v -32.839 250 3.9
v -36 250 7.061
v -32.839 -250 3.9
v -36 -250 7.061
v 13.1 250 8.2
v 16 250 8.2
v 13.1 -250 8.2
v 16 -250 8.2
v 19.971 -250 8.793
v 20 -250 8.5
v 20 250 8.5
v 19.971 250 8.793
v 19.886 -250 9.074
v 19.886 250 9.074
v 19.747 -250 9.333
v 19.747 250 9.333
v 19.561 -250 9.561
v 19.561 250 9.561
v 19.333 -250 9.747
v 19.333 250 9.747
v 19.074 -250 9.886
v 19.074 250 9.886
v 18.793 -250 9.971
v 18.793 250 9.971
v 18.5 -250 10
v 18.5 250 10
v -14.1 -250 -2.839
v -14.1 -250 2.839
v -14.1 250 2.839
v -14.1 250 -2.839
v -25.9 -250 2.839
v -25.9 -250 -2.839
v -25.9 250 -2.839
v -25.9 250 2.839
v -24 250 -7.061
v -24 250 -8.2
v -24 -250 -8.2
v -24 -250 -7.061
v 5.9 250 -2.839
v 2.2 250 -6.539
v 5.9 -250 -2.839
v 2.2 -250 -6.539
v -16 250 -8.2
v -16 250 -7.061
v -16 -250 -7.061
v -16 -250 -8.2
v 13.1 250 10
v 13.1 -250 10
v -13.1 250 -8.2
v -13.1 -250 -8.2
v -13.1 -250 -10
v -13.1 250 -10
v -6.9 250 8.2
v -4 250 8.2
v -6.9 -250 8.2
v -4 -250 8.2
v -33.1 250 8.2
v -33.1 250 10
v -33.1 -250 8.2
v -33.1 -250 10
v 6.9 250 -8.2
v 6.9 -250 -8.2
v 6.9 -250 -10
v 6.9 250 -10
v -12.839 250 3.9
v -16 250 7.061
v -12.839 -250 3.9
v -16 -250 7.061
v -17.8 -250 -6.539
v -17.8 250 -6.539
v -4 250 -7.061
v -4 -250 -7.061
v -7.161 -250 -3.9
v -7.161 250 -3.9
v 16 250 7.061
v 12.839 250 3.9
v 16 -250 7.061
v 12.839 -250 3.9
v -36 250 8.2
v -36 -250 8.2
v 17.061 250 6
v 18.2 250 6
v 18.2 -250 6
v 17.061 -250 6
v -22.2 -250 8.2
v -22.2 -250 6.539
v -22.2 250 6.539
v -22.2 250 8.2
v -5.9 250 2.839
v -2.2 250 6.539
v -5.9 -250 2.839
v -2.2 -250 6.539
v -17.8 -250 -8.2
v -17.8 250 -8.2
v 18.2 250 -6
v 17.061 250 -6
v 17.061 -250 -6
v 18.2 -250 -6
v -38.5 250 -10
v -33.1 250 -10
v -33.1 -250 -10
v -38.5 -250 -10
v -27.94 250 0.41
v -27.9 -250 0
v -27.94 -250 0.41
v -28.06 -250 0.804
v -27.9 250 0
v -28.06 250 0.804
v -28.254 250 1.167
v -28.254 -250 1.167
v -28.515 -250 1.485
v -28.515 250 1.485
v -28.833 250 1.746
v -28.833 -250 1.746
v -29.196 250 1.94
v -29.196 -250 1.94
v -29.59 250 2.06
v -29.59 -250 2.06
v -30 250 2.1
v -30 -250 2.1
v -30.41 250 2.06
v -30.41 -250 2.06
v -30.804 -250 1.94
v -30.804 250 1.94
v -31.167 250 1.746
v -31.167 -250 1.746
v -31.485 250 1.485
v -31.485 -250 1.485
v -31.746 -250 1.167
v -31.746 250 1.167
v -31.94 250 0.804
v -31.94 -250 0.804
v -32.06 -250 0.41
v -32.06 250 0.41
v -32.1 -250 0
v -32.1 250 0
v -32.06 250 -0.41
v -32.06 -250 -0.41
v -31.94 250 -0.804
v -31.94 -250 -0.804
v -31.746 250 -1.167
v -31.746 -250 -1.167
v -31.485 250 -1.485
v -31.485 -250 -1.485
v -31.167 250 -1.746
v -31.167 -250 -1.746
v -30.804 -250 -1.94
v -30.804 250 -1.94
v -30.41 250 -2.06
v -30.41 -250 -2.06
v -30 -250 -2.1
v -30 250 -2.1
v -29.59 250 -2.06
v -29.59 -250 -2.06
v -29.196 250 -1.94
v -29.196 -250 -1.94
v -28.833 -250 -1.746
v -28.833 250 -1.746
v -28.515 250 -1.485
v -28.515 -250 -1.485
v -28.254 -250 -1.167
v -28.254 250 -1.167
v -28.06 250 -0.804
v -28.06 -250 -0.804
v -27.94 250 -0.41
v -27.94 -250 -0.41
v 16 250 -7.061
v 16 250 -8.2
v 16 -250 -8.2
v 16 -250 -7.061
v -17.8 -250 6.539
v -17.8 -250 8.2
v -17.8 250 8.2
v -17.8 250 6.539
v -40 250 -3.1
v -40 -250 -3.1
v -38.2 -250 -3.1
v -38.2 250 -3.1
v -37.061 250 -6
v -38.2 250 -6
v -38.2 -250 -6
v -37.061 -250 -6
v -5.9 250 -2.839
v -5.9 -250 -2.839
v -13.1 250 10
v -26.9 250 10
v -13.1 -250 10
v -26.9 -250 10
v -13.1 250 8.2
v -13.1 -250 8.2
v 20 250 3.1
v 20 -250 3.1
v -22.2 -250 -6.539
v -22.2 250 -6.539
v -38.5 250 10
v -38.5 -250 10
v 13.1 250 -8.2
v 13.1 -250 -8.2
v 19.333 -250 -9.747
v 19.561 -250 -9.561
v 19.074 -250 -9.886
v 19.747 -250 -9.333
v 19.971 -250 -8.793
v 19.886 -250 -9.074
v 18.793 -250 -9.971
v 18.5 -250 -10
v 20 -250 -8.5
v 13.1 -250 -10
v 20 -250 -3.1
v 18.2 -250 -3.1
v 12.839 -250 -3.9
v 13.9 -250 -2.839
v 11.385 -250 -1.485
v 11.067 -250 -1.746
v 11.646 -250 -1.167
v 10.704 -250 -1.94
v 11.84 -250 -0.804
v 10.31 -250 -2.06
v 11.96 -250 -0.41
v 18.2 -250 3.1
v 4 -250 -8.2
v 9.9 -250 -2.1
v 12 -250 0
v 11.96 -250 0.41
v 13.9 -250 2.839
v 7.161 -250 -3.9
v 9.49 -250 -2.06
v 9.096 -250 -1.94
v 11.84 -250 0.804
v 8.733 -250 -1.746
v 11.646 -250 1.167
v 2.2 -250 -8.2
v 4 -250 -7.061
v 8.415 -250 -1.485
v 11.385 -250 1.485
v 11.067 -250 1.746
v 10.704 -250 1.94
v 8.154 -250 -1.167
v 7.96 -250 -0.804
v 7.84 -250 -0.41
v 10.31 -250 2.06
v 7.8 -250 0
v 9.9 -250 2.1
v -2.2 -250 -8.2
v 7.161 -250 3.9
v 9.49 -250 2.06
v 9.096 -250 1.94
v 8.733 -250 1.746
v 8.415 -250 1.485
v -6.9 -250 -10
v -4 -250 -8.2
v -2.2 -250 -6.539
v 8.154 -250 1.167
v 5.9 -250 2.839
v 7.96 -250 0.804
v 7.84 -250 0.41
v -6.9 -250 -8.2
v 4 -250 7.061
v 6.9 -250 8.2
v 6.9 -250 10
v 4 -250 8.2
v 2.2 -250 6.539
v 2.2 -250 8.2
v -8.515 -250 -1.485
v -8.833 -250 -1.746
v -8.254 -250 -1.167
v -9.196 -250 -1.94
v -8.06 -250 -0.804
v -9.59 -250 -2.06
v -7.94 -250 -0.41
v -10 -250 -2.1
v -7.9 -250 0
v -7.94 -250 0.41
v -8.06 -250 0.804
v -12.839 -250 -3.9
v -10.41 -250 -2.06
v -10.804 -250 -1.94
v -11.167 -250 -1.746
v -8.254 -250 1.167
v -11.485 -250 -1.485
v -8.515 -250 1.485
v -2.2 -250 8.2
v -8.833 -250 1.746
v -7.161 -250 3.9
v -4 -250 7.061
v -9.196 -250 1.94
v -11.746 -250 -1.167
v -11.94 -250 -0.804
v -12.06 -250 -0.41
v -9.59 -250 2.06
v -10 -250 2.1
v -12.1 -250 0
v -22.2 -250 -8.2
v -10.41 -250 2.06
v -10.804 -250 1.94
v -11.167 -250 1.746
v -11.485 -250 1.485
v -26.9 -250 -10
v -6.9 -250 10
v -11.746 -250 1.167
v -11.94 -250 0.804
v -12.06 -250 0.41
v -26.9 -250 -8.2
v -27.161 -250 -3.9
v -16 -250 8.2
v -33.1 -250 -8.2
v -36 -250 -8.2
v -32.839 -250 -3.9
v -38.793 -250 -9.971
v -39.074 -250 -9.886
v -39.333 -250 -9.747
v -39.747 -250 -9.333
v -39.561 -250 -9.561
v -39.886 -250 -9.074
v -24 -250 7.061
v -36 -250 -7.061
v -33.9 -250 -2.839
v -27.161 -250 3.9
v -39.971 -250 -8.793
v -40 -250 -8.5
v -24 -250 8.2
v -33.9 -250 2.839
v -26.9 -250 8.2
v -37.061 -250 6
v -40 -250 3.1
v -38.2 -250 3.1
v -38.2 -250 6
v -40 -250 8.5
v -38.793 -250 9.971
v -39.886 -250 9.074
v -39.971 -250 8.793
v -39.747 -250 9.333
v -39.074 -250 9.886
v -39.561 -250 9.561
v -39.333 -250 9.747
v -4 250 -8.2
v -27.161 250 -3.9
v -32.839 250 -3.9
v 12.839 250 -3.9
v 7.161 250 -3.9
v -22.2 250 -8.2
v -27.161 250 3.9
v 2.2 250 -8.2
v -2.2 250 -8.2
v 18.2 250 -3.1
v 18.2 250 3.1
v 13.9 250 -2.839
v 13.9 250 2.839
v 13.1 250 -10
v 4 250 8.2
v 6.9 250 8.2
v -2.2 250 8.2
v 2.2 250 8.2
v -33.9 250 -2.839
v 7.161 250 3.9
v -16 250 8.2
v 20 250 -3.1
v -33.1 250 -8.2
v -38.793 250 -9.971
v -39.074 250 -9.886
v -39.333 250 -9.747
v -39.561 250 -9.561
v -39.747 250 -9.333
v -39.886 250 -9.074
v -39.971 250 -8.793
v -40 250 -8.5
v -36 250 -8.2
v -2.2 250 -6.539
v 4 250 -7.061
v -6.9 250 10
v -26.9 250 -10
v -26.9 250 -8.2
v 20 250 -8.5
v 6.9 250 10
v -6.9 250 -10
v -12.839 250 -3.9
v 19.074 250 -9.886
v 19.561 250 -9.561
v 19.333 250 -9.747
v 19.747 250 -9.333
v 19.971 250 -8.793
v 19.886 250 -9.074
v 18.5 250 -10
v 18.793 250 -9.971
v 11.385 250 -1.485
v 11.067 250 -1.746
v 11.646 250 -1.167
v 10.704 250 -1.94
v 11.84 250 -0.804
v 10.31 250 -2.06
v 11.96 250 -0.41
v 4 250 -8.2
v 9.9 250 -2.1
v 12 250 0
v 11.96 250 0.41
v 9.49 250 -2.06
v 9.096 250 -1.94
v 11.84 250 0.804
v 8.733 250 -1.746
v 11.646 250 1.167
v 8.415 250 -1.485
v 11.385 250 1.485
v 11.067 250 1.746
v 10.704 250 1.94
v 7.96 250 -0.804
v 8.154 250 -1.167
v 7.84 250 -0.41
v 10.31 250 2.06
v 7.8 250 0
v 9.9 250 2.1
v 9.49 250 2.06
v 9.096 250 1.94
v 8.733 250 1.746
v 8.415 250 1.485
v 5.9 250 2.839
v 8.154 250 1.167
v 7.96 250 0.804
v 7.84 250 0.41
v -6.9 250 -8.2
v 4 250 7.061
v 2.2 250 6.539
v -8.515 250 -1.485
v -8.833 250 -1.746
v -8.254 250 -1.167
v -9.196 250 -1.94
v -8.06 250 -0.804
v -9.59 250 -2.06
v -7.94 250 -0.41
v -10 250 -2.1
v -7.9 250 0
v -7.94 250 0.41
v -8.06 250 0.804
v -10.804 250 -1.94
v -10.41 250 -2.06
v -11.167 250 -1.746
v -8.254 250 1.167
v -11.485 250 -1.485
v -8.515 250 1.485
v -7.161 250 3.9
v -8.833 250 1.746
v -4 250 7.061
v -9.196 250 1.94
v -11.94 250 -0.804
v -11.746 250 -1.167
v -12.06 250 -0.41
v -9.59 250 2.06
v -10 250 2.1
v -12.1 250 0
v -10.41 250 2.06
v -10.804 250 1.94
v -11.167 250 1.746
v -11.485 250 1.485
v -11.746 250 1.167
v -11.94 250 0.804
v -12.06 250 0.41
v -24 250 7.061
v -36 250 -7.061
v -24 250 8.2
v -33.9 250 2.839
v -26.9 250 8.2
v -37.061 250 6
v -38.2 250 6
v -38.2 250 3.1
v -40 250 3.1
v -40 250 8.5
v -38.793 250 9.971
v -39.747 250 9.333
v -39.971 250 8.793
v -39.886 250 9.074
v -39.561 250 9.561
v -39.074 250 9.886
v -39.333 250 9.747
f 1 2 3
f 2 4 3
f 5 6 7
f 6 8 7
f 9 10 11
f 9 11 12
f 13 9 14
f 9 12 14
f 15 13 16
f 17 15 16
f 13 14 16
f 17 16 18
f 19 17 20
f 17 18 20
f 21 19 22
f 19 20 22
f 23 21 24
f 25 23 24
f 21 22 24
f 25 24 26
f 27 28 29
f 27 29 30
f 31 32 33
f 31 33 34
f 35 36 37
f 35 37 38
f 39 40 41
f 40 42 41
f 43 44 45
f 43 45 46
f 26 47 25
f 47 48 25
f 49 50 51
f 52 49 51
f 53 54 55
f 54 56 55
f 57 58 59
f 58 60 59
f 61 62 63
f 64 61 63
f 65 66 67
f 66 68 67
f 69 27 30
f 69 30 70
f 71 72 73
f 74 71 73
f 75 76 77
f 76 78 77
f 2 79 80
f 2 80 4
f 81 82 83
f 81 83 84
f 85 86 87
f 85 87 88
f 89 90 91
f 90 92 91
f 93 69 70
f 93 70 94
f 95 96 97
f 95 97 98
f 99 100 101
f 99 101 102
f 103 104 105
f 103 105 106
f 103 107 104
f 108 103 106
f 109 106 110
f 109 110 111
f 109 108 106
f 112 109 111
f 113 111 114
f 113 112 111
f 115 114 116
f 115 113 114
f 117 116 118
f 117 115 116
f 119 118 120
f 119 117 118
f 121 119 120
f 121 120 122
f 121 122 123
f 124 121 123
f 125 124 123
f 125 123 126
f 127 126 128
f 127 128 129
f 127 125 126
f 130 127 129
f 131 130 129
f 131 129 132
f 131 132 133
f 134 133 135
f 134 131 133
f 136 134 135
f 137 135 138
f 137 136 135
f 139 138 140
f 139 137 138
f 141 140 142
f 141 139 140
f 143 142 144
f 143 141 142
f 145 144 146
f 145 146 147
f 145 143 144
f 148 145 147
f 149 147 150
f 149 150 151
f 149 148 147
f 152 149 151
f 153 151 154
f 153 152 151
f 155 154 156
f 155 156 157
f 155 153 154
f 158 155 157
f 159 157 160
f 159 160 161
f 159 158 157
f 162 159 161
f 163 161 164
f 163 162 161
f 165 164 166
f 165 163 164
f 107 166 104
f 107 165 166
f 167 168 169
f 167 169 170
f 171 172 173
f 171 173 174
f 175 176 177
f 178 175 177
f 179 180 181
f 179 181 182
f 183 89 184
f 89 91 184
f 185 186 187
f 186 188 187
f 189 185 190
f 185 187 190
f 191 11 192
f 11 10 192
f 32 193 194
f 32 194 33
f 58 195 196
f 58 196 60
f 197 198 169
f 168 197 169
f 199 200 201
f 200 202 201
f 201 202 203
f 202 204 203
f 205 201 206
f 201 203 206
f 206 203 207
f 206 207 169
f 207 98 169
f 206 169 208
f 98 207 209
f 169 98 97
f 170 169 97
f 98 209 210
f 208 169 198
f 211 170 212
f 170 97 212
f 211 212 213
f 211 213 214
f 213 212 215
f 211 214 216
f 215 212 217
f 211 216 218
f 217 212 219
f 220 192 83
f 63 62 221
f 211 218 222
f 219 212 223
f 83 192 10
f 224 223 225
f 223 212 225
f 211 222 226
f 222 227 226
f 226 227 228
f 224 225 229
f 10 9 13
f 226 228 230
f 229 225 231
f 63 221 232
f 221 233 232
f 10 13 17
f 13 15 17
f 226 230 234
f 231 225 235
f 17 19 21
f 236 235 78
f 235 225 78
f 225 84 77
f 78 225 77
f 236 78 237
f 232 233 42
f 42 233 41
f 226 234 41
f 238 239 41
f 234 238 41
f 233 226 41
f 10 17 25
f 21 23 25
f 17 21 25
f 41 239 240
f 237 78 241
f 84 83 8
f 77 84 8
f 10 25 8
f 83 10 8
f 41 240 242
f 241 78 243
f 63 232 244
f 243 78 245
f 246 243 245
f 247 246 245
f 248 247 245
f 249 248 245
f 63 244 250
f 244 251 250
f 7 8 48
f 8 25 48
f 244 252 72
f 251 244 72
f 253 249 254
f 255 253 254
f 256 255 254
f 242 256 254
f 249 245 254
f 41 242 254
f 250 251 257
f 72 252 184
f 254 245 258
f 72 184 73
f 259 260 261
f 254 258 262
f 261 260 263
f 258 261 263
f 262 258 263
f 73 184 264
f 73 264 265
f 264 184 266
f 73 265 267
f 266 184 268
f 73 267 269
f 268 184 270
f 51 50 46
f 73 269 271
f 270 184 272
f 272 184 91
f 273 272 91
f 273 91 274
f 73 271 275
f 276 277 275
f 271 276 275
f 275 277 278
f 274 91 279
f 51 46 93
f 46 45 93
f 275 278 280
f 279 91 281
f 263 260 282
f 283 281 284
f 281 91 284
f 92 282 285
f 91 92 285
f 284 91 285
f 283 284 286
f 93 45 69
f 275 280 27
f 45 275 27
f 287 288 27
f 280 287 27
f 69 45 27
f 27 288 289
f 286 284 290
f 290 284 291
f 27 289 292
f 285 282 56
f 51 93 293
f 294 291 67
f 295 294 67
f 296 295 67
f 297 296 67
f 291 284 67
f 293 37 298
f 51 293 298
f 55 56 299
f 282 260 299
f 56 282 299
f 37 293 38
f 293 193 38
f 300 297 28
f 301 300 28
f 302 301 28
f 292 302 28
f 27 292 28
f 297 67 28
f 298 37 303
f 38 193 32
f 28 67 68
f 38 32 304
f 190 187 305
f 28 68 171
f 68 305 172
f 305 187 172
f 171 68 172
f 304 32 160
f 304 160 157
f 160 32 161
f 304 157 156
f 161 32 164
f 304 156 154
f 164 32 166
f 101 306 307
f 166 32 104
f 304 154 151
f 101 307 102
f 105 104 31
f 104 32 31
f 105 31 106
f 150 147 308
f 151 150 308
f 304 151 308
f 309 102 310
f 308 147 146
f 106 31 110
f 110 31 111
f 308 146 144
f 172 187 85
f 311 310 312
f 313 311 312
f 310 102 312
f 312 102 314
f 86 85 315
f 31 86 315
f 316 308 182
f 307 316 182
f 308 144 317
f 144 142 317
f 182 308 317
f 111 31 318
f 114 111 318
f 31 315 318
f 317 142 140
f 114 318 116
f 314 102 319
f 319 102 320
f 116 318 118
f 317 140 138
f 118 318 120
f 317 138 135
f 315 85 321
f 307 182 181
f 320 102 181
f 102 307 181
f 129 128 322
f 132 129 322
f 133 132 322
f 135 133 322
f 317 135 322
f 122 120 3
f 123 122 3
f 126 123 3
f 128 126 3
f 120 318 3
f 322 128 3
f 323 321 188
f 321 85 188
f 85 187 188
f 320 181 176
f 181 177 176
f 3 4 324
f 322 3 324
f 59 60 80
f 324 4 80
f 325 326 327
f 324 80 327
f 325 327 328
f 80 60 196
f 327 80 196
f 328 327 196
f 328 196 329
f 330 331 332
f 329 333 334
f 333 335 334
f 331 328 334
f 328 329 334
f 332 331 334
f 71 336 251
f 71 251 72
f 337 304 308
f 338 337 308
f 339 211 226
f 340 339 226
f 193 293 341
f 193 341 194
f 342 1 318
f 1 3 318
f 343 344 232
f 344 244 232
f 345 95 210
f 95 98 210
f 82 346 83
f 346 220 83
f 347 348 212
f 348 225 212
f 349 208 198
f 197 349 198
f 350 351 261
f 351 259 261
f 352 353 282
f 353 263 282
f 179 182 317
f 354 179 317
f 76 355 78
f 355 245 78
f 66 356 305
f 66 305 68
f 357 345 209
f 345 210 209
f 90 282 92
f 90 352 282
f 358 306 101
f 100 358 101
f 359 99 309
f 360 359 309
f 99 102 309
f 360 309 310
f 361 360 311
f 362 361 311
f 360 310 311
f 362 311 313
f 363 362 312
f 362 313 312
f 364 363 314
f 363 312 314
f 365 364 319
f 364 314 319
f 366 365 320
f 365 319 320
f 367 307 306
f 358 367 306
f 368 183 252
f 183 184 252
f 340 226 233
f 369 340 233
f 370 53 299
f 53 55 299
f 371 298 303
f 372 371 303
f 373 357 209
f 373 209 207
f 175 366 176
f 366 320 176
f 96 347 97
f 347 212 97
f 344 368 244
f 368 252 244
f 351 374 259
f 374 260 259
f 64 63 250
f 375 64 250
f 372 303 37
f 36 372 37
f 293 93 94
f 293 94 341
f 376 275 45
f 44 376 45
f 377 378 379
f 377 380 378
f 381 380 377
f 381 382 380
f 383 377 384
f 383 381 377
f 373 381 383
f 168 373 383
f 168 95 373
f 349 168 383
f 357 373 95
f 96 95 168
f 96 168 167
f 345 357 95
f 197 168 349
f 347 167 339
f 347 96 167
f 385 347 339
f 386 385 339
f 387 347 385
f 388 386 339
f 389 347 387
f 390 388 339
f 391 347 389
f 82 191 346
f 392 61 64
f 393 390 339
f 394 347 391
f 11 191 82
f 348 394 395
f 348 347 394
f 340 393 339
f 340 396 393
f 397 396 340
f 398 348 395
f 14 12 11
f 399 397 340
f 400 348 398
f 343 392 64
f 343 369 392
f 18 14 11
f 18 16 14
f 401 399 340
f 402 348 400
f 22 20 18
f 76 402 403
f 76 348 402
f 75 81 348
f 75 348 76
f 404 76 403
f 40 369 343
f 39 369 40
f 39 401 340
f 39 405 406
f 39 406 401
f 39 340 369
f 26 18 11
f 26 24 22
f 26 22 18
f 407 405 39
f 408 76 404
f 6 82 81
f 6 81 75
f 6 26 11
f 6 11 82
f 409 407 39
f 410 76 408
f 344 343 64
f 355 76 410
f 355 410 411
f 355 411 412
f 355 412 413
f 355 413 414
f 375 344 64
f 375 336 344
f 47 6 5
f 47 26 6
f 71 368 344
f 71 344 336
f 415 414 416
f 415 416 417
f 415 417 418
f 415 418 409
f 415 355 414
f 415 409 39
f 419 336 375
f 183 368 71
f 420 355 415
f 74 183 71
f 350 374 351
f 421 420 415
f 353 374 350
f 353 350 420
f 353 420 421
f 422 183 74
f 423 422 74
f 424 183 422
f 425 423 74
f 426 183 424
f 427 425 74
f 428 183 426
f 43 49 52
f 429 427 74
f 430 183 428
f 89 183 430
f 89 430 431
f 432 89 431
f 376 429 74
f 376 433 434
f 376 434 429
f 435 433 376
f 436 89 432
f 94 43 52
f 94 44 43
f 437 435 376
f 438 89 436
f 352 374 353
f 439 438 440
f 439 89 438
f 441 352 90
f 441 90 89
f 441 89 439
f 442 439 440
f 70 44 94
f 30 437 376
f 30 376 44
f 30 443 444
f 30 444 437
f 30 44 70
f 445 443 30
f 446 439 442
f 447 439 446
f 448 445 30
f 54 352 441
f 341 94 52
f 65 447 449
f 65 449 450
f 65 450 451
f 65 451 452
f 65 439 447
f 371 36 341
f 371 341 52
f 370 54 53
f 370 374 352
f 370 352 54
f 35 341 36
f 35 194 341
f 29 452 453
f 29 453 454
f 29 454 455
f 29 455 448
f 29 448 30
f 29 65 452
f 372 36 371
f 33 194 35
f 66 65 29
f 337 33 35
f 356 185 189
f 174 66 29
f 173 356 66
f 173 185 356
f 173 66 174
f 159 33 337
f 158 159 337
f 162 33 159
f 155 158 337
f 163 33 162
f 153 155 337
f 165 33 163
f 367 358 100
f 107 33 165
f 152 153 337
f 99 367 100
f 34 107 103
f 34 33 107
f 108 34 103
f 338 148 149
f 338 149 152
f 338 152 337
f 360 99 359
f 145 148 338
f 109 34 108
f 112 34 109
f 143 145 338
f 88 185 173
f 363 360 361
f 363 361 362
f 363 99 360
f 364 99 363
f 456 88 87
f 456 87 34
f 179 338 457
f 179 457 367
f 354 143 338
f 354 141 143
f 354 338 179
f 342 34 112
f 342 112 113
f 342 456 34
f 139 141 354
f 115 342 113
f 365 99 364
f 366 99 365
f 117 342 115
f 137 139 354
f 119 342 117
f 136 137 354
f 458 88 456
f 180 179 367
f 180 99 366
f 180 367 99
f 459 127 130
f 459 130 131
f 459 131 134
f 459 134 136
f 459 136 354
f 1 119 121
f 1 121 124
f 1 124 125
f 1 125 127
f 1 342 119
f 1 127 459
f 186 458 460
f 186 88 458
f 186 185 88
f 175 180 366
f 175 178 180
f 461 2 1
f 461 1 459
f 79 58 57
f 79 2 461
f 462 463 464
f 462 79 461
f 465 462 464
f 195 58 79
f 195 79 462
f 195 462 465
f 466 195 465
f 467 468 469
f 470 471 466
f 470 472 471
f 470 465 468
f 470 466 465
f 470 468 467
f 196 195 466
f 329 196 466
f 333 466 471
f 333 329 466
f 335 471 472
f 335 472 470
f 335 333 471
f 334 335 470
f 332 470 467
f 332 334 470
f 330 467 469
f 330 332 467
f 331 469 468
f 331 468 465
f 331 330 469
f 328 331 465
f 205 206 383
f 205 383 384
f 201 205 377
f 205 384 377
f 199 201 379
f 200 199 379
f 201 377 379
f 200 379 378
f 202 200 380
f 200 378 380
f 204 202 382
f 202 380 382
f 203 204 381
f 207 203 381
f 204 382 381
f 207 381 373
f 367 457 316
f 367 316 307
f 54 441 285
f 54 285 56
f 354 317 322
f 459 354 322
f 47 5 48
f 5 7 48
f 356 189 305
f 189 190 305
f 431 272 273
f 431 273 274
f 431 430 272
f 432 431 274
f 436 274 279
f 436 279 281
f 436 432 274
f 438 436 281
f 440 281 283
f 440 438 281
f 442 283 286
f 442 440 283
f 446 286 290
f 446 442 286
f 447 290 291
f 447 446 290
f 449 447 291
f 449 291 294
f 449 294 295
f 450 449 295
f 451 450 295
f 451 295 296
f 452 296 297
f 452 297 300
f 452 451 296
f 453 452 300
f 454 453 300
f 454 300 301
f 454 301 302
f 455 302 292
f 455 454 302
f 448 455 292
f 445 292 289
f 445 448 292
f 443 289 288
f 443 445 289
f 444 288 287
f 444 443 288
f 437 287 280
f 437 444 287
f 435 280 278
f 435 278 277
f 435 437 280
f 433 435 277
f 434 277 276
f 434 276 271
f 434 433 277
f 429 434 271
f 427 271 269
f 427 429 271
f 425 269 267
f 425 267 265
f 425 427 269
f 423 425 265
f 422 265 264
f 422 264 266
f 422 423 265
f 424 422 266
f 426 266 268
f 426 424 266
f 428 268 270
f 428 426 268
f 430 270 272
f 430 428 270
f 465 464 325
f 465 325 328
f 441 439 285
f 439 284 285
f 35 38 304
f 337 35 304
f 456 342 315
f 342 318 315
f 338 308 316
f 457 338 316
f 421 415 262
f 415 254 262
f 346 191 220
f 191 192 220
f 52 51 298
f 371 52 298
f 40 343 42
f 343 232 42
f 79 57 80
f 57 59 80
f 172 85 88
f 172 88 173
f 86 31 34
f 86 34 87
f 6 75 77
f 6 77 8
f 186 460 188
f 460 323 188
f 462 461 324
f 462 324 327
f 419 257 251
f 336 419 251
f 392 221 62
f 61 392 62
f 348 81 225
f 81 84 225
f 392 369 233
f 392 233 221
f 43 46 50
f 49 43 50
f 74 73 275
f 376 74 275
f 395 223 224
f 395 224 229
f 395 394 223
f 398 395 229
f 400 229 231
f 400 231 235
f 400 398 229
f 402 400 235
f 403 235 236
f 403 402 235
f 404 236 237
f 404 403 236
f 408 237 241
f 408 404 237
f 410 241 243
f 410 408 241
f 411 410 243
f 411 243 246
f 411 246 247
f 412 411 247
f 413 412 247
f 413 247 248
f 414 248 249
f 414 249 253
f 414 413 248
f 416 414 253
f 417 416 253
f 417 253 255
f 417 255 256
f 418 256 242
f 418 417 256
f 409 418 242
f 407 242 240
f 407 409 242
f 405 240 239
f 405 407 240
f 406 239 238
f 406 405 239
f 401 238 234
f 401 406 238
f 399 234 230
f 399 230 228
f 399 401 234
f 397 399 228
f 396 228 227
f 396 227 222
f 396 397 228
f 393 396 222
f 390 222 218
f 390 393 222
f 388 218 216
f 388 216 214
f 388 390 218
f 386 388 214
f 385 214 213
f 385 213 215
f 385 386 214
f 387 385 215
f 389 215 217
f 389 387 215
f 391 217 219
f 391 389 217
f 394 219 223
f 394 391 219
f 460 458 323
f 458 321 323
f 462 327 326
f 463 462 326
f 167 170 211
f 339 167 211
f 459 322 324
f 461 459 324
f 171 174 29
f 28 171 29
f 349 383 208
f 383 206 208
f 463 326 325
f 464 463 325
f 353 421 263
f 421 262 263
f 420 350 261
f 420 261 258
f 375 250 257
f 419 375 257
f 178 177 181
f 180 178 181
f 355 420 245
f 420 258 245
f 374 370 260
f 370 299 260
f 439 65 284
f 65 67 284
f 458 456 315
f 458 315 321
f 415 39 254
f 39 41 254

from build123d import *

# Parameters (mm, degrees)
SKETCH_R  = 2.1
PAD_DEPTH = 250
FILLET_R  = 1.5


with BuildPart() as part:
    # Sketch → Pad (new body, symmetric)
    with BuildSketch(Plane.XZ):
        Polygon((-10, 10), (-3.1, 10), (-3.1, 8.2), (-6, 8.2), (-6, 7.06066), (-2.83934, 3.9), (2.83934, 3.9), (6, 7.06066), (6, 8.2), (3.1, 8.2), (3.1, 10), (16.9, 10), (16.9, 8.2), (14, 8.2), (14, 7.06066), (17.16066, 3.9), (22.83934, 3.9), (26, 7.06066), (26, 8.2), (23.1, 8.2), (23.1, 10), (36.9, 10), (36.9, 8.2), (34, 8.2), (34, 7.06066), (37.16066, 3.9), (42.83934, 3.9), (46, 7.06066), (46, 8.2), (43.1, 8.2), (43.1, 10), (50, 10), (50, 3.1), (48.2, 3.1), (48.2, 6), (47.06066, 6), (43.9, 2.83934), (43.9, -2.83934), (47.06066, -6), (48.2, -6), (48.2, -3.1), (50, -3.1), (50, -10), (43.1, -10), (43.1, -8.2), (46, -8.2), (46, -7.06066), (42.83934, -3.9), (37.16066, -3.9), (34, -7.06066), (34, -8.2), (36.9, -8.2), (36.9, -10), (23.1, -10), (23.1, -8.2), (26, -8.2), (26, -7.06066), (22.83934, -3.9), (17.16066, -3.9), (14, -7.06066), (14, -8.2), (16.9, -8.2), (16.9, -10), (3.1, -10), (3.1, -8.2), (6, -8.2), (6, -7.06066), (2.83934, -3.9), (-2.83934, -3.9), (-6, -7.06066), (-6, -8.2), (-3.1, -8.2), (-3.1, -10), (-10, -10), (-10, -3.1), (-8.2, -3.1), (-8.2, -6), (-7.06066, -6), (-3.9, -2.83934), (-3.9, 2.83934), (-7.06066, 6), (-8.2, 6), (-8.2, 3.1), (-10, 3.1), align=None)
        Circle(SKETCH_R, mode=Mode.SUBTRACT)
        with Locations((20, 0)):
            Circle(SKETCH_R, mode=Mode.SUBTRACT)
        with Locations((39.9, 0)):
            Circle(SKETCH_R, mode=Mode.SUBTRACT)
        Polygon((7.8, -6.53934), (4.1, -2.83934), (4.1, 2.83934), (7.8, 6.53934), (7.8, 8.2), (12.2, 8.2), (12.2, 6.53934), (15.9, 2.83934), (15.9, -2.83934), (12.2, -6.53934), (12.2, -8.2), (7.8, -8.2), align=None, mode=Mode.SUBTRACT)
        Polygon((27.8, 8.2), (27.8, 6.53934), (24.1, 2.83934), (24.1, -2.83934), (27.8, -6.53934), (27.8, -8.2), (32.2, -8.2), (32.2, -6.53934), (35.9, -2.83934), (35.9, 2.83934), (32.2, 6.53934), (32.2, 8.2), align=None, mode=Mode.SUBTRACT)
    extrude(amount=PAD_DEPTH, both=True)

    # Fillet
    fillet_edges = [part.edges().sort_by_distance(p)[0] for p in [
        (-10, 0, 10),
        (50, 0, 10),
        (-10, 0, -10),
        (50, 0, -10),
    ]]
    fillet(fillet_edges, radius=FILLET_R)


with BuildPart() as part_1:
    # Body placement: moved
    add(part.part.moved(Location((-30, 0, 0))))


solid = part_1.part
